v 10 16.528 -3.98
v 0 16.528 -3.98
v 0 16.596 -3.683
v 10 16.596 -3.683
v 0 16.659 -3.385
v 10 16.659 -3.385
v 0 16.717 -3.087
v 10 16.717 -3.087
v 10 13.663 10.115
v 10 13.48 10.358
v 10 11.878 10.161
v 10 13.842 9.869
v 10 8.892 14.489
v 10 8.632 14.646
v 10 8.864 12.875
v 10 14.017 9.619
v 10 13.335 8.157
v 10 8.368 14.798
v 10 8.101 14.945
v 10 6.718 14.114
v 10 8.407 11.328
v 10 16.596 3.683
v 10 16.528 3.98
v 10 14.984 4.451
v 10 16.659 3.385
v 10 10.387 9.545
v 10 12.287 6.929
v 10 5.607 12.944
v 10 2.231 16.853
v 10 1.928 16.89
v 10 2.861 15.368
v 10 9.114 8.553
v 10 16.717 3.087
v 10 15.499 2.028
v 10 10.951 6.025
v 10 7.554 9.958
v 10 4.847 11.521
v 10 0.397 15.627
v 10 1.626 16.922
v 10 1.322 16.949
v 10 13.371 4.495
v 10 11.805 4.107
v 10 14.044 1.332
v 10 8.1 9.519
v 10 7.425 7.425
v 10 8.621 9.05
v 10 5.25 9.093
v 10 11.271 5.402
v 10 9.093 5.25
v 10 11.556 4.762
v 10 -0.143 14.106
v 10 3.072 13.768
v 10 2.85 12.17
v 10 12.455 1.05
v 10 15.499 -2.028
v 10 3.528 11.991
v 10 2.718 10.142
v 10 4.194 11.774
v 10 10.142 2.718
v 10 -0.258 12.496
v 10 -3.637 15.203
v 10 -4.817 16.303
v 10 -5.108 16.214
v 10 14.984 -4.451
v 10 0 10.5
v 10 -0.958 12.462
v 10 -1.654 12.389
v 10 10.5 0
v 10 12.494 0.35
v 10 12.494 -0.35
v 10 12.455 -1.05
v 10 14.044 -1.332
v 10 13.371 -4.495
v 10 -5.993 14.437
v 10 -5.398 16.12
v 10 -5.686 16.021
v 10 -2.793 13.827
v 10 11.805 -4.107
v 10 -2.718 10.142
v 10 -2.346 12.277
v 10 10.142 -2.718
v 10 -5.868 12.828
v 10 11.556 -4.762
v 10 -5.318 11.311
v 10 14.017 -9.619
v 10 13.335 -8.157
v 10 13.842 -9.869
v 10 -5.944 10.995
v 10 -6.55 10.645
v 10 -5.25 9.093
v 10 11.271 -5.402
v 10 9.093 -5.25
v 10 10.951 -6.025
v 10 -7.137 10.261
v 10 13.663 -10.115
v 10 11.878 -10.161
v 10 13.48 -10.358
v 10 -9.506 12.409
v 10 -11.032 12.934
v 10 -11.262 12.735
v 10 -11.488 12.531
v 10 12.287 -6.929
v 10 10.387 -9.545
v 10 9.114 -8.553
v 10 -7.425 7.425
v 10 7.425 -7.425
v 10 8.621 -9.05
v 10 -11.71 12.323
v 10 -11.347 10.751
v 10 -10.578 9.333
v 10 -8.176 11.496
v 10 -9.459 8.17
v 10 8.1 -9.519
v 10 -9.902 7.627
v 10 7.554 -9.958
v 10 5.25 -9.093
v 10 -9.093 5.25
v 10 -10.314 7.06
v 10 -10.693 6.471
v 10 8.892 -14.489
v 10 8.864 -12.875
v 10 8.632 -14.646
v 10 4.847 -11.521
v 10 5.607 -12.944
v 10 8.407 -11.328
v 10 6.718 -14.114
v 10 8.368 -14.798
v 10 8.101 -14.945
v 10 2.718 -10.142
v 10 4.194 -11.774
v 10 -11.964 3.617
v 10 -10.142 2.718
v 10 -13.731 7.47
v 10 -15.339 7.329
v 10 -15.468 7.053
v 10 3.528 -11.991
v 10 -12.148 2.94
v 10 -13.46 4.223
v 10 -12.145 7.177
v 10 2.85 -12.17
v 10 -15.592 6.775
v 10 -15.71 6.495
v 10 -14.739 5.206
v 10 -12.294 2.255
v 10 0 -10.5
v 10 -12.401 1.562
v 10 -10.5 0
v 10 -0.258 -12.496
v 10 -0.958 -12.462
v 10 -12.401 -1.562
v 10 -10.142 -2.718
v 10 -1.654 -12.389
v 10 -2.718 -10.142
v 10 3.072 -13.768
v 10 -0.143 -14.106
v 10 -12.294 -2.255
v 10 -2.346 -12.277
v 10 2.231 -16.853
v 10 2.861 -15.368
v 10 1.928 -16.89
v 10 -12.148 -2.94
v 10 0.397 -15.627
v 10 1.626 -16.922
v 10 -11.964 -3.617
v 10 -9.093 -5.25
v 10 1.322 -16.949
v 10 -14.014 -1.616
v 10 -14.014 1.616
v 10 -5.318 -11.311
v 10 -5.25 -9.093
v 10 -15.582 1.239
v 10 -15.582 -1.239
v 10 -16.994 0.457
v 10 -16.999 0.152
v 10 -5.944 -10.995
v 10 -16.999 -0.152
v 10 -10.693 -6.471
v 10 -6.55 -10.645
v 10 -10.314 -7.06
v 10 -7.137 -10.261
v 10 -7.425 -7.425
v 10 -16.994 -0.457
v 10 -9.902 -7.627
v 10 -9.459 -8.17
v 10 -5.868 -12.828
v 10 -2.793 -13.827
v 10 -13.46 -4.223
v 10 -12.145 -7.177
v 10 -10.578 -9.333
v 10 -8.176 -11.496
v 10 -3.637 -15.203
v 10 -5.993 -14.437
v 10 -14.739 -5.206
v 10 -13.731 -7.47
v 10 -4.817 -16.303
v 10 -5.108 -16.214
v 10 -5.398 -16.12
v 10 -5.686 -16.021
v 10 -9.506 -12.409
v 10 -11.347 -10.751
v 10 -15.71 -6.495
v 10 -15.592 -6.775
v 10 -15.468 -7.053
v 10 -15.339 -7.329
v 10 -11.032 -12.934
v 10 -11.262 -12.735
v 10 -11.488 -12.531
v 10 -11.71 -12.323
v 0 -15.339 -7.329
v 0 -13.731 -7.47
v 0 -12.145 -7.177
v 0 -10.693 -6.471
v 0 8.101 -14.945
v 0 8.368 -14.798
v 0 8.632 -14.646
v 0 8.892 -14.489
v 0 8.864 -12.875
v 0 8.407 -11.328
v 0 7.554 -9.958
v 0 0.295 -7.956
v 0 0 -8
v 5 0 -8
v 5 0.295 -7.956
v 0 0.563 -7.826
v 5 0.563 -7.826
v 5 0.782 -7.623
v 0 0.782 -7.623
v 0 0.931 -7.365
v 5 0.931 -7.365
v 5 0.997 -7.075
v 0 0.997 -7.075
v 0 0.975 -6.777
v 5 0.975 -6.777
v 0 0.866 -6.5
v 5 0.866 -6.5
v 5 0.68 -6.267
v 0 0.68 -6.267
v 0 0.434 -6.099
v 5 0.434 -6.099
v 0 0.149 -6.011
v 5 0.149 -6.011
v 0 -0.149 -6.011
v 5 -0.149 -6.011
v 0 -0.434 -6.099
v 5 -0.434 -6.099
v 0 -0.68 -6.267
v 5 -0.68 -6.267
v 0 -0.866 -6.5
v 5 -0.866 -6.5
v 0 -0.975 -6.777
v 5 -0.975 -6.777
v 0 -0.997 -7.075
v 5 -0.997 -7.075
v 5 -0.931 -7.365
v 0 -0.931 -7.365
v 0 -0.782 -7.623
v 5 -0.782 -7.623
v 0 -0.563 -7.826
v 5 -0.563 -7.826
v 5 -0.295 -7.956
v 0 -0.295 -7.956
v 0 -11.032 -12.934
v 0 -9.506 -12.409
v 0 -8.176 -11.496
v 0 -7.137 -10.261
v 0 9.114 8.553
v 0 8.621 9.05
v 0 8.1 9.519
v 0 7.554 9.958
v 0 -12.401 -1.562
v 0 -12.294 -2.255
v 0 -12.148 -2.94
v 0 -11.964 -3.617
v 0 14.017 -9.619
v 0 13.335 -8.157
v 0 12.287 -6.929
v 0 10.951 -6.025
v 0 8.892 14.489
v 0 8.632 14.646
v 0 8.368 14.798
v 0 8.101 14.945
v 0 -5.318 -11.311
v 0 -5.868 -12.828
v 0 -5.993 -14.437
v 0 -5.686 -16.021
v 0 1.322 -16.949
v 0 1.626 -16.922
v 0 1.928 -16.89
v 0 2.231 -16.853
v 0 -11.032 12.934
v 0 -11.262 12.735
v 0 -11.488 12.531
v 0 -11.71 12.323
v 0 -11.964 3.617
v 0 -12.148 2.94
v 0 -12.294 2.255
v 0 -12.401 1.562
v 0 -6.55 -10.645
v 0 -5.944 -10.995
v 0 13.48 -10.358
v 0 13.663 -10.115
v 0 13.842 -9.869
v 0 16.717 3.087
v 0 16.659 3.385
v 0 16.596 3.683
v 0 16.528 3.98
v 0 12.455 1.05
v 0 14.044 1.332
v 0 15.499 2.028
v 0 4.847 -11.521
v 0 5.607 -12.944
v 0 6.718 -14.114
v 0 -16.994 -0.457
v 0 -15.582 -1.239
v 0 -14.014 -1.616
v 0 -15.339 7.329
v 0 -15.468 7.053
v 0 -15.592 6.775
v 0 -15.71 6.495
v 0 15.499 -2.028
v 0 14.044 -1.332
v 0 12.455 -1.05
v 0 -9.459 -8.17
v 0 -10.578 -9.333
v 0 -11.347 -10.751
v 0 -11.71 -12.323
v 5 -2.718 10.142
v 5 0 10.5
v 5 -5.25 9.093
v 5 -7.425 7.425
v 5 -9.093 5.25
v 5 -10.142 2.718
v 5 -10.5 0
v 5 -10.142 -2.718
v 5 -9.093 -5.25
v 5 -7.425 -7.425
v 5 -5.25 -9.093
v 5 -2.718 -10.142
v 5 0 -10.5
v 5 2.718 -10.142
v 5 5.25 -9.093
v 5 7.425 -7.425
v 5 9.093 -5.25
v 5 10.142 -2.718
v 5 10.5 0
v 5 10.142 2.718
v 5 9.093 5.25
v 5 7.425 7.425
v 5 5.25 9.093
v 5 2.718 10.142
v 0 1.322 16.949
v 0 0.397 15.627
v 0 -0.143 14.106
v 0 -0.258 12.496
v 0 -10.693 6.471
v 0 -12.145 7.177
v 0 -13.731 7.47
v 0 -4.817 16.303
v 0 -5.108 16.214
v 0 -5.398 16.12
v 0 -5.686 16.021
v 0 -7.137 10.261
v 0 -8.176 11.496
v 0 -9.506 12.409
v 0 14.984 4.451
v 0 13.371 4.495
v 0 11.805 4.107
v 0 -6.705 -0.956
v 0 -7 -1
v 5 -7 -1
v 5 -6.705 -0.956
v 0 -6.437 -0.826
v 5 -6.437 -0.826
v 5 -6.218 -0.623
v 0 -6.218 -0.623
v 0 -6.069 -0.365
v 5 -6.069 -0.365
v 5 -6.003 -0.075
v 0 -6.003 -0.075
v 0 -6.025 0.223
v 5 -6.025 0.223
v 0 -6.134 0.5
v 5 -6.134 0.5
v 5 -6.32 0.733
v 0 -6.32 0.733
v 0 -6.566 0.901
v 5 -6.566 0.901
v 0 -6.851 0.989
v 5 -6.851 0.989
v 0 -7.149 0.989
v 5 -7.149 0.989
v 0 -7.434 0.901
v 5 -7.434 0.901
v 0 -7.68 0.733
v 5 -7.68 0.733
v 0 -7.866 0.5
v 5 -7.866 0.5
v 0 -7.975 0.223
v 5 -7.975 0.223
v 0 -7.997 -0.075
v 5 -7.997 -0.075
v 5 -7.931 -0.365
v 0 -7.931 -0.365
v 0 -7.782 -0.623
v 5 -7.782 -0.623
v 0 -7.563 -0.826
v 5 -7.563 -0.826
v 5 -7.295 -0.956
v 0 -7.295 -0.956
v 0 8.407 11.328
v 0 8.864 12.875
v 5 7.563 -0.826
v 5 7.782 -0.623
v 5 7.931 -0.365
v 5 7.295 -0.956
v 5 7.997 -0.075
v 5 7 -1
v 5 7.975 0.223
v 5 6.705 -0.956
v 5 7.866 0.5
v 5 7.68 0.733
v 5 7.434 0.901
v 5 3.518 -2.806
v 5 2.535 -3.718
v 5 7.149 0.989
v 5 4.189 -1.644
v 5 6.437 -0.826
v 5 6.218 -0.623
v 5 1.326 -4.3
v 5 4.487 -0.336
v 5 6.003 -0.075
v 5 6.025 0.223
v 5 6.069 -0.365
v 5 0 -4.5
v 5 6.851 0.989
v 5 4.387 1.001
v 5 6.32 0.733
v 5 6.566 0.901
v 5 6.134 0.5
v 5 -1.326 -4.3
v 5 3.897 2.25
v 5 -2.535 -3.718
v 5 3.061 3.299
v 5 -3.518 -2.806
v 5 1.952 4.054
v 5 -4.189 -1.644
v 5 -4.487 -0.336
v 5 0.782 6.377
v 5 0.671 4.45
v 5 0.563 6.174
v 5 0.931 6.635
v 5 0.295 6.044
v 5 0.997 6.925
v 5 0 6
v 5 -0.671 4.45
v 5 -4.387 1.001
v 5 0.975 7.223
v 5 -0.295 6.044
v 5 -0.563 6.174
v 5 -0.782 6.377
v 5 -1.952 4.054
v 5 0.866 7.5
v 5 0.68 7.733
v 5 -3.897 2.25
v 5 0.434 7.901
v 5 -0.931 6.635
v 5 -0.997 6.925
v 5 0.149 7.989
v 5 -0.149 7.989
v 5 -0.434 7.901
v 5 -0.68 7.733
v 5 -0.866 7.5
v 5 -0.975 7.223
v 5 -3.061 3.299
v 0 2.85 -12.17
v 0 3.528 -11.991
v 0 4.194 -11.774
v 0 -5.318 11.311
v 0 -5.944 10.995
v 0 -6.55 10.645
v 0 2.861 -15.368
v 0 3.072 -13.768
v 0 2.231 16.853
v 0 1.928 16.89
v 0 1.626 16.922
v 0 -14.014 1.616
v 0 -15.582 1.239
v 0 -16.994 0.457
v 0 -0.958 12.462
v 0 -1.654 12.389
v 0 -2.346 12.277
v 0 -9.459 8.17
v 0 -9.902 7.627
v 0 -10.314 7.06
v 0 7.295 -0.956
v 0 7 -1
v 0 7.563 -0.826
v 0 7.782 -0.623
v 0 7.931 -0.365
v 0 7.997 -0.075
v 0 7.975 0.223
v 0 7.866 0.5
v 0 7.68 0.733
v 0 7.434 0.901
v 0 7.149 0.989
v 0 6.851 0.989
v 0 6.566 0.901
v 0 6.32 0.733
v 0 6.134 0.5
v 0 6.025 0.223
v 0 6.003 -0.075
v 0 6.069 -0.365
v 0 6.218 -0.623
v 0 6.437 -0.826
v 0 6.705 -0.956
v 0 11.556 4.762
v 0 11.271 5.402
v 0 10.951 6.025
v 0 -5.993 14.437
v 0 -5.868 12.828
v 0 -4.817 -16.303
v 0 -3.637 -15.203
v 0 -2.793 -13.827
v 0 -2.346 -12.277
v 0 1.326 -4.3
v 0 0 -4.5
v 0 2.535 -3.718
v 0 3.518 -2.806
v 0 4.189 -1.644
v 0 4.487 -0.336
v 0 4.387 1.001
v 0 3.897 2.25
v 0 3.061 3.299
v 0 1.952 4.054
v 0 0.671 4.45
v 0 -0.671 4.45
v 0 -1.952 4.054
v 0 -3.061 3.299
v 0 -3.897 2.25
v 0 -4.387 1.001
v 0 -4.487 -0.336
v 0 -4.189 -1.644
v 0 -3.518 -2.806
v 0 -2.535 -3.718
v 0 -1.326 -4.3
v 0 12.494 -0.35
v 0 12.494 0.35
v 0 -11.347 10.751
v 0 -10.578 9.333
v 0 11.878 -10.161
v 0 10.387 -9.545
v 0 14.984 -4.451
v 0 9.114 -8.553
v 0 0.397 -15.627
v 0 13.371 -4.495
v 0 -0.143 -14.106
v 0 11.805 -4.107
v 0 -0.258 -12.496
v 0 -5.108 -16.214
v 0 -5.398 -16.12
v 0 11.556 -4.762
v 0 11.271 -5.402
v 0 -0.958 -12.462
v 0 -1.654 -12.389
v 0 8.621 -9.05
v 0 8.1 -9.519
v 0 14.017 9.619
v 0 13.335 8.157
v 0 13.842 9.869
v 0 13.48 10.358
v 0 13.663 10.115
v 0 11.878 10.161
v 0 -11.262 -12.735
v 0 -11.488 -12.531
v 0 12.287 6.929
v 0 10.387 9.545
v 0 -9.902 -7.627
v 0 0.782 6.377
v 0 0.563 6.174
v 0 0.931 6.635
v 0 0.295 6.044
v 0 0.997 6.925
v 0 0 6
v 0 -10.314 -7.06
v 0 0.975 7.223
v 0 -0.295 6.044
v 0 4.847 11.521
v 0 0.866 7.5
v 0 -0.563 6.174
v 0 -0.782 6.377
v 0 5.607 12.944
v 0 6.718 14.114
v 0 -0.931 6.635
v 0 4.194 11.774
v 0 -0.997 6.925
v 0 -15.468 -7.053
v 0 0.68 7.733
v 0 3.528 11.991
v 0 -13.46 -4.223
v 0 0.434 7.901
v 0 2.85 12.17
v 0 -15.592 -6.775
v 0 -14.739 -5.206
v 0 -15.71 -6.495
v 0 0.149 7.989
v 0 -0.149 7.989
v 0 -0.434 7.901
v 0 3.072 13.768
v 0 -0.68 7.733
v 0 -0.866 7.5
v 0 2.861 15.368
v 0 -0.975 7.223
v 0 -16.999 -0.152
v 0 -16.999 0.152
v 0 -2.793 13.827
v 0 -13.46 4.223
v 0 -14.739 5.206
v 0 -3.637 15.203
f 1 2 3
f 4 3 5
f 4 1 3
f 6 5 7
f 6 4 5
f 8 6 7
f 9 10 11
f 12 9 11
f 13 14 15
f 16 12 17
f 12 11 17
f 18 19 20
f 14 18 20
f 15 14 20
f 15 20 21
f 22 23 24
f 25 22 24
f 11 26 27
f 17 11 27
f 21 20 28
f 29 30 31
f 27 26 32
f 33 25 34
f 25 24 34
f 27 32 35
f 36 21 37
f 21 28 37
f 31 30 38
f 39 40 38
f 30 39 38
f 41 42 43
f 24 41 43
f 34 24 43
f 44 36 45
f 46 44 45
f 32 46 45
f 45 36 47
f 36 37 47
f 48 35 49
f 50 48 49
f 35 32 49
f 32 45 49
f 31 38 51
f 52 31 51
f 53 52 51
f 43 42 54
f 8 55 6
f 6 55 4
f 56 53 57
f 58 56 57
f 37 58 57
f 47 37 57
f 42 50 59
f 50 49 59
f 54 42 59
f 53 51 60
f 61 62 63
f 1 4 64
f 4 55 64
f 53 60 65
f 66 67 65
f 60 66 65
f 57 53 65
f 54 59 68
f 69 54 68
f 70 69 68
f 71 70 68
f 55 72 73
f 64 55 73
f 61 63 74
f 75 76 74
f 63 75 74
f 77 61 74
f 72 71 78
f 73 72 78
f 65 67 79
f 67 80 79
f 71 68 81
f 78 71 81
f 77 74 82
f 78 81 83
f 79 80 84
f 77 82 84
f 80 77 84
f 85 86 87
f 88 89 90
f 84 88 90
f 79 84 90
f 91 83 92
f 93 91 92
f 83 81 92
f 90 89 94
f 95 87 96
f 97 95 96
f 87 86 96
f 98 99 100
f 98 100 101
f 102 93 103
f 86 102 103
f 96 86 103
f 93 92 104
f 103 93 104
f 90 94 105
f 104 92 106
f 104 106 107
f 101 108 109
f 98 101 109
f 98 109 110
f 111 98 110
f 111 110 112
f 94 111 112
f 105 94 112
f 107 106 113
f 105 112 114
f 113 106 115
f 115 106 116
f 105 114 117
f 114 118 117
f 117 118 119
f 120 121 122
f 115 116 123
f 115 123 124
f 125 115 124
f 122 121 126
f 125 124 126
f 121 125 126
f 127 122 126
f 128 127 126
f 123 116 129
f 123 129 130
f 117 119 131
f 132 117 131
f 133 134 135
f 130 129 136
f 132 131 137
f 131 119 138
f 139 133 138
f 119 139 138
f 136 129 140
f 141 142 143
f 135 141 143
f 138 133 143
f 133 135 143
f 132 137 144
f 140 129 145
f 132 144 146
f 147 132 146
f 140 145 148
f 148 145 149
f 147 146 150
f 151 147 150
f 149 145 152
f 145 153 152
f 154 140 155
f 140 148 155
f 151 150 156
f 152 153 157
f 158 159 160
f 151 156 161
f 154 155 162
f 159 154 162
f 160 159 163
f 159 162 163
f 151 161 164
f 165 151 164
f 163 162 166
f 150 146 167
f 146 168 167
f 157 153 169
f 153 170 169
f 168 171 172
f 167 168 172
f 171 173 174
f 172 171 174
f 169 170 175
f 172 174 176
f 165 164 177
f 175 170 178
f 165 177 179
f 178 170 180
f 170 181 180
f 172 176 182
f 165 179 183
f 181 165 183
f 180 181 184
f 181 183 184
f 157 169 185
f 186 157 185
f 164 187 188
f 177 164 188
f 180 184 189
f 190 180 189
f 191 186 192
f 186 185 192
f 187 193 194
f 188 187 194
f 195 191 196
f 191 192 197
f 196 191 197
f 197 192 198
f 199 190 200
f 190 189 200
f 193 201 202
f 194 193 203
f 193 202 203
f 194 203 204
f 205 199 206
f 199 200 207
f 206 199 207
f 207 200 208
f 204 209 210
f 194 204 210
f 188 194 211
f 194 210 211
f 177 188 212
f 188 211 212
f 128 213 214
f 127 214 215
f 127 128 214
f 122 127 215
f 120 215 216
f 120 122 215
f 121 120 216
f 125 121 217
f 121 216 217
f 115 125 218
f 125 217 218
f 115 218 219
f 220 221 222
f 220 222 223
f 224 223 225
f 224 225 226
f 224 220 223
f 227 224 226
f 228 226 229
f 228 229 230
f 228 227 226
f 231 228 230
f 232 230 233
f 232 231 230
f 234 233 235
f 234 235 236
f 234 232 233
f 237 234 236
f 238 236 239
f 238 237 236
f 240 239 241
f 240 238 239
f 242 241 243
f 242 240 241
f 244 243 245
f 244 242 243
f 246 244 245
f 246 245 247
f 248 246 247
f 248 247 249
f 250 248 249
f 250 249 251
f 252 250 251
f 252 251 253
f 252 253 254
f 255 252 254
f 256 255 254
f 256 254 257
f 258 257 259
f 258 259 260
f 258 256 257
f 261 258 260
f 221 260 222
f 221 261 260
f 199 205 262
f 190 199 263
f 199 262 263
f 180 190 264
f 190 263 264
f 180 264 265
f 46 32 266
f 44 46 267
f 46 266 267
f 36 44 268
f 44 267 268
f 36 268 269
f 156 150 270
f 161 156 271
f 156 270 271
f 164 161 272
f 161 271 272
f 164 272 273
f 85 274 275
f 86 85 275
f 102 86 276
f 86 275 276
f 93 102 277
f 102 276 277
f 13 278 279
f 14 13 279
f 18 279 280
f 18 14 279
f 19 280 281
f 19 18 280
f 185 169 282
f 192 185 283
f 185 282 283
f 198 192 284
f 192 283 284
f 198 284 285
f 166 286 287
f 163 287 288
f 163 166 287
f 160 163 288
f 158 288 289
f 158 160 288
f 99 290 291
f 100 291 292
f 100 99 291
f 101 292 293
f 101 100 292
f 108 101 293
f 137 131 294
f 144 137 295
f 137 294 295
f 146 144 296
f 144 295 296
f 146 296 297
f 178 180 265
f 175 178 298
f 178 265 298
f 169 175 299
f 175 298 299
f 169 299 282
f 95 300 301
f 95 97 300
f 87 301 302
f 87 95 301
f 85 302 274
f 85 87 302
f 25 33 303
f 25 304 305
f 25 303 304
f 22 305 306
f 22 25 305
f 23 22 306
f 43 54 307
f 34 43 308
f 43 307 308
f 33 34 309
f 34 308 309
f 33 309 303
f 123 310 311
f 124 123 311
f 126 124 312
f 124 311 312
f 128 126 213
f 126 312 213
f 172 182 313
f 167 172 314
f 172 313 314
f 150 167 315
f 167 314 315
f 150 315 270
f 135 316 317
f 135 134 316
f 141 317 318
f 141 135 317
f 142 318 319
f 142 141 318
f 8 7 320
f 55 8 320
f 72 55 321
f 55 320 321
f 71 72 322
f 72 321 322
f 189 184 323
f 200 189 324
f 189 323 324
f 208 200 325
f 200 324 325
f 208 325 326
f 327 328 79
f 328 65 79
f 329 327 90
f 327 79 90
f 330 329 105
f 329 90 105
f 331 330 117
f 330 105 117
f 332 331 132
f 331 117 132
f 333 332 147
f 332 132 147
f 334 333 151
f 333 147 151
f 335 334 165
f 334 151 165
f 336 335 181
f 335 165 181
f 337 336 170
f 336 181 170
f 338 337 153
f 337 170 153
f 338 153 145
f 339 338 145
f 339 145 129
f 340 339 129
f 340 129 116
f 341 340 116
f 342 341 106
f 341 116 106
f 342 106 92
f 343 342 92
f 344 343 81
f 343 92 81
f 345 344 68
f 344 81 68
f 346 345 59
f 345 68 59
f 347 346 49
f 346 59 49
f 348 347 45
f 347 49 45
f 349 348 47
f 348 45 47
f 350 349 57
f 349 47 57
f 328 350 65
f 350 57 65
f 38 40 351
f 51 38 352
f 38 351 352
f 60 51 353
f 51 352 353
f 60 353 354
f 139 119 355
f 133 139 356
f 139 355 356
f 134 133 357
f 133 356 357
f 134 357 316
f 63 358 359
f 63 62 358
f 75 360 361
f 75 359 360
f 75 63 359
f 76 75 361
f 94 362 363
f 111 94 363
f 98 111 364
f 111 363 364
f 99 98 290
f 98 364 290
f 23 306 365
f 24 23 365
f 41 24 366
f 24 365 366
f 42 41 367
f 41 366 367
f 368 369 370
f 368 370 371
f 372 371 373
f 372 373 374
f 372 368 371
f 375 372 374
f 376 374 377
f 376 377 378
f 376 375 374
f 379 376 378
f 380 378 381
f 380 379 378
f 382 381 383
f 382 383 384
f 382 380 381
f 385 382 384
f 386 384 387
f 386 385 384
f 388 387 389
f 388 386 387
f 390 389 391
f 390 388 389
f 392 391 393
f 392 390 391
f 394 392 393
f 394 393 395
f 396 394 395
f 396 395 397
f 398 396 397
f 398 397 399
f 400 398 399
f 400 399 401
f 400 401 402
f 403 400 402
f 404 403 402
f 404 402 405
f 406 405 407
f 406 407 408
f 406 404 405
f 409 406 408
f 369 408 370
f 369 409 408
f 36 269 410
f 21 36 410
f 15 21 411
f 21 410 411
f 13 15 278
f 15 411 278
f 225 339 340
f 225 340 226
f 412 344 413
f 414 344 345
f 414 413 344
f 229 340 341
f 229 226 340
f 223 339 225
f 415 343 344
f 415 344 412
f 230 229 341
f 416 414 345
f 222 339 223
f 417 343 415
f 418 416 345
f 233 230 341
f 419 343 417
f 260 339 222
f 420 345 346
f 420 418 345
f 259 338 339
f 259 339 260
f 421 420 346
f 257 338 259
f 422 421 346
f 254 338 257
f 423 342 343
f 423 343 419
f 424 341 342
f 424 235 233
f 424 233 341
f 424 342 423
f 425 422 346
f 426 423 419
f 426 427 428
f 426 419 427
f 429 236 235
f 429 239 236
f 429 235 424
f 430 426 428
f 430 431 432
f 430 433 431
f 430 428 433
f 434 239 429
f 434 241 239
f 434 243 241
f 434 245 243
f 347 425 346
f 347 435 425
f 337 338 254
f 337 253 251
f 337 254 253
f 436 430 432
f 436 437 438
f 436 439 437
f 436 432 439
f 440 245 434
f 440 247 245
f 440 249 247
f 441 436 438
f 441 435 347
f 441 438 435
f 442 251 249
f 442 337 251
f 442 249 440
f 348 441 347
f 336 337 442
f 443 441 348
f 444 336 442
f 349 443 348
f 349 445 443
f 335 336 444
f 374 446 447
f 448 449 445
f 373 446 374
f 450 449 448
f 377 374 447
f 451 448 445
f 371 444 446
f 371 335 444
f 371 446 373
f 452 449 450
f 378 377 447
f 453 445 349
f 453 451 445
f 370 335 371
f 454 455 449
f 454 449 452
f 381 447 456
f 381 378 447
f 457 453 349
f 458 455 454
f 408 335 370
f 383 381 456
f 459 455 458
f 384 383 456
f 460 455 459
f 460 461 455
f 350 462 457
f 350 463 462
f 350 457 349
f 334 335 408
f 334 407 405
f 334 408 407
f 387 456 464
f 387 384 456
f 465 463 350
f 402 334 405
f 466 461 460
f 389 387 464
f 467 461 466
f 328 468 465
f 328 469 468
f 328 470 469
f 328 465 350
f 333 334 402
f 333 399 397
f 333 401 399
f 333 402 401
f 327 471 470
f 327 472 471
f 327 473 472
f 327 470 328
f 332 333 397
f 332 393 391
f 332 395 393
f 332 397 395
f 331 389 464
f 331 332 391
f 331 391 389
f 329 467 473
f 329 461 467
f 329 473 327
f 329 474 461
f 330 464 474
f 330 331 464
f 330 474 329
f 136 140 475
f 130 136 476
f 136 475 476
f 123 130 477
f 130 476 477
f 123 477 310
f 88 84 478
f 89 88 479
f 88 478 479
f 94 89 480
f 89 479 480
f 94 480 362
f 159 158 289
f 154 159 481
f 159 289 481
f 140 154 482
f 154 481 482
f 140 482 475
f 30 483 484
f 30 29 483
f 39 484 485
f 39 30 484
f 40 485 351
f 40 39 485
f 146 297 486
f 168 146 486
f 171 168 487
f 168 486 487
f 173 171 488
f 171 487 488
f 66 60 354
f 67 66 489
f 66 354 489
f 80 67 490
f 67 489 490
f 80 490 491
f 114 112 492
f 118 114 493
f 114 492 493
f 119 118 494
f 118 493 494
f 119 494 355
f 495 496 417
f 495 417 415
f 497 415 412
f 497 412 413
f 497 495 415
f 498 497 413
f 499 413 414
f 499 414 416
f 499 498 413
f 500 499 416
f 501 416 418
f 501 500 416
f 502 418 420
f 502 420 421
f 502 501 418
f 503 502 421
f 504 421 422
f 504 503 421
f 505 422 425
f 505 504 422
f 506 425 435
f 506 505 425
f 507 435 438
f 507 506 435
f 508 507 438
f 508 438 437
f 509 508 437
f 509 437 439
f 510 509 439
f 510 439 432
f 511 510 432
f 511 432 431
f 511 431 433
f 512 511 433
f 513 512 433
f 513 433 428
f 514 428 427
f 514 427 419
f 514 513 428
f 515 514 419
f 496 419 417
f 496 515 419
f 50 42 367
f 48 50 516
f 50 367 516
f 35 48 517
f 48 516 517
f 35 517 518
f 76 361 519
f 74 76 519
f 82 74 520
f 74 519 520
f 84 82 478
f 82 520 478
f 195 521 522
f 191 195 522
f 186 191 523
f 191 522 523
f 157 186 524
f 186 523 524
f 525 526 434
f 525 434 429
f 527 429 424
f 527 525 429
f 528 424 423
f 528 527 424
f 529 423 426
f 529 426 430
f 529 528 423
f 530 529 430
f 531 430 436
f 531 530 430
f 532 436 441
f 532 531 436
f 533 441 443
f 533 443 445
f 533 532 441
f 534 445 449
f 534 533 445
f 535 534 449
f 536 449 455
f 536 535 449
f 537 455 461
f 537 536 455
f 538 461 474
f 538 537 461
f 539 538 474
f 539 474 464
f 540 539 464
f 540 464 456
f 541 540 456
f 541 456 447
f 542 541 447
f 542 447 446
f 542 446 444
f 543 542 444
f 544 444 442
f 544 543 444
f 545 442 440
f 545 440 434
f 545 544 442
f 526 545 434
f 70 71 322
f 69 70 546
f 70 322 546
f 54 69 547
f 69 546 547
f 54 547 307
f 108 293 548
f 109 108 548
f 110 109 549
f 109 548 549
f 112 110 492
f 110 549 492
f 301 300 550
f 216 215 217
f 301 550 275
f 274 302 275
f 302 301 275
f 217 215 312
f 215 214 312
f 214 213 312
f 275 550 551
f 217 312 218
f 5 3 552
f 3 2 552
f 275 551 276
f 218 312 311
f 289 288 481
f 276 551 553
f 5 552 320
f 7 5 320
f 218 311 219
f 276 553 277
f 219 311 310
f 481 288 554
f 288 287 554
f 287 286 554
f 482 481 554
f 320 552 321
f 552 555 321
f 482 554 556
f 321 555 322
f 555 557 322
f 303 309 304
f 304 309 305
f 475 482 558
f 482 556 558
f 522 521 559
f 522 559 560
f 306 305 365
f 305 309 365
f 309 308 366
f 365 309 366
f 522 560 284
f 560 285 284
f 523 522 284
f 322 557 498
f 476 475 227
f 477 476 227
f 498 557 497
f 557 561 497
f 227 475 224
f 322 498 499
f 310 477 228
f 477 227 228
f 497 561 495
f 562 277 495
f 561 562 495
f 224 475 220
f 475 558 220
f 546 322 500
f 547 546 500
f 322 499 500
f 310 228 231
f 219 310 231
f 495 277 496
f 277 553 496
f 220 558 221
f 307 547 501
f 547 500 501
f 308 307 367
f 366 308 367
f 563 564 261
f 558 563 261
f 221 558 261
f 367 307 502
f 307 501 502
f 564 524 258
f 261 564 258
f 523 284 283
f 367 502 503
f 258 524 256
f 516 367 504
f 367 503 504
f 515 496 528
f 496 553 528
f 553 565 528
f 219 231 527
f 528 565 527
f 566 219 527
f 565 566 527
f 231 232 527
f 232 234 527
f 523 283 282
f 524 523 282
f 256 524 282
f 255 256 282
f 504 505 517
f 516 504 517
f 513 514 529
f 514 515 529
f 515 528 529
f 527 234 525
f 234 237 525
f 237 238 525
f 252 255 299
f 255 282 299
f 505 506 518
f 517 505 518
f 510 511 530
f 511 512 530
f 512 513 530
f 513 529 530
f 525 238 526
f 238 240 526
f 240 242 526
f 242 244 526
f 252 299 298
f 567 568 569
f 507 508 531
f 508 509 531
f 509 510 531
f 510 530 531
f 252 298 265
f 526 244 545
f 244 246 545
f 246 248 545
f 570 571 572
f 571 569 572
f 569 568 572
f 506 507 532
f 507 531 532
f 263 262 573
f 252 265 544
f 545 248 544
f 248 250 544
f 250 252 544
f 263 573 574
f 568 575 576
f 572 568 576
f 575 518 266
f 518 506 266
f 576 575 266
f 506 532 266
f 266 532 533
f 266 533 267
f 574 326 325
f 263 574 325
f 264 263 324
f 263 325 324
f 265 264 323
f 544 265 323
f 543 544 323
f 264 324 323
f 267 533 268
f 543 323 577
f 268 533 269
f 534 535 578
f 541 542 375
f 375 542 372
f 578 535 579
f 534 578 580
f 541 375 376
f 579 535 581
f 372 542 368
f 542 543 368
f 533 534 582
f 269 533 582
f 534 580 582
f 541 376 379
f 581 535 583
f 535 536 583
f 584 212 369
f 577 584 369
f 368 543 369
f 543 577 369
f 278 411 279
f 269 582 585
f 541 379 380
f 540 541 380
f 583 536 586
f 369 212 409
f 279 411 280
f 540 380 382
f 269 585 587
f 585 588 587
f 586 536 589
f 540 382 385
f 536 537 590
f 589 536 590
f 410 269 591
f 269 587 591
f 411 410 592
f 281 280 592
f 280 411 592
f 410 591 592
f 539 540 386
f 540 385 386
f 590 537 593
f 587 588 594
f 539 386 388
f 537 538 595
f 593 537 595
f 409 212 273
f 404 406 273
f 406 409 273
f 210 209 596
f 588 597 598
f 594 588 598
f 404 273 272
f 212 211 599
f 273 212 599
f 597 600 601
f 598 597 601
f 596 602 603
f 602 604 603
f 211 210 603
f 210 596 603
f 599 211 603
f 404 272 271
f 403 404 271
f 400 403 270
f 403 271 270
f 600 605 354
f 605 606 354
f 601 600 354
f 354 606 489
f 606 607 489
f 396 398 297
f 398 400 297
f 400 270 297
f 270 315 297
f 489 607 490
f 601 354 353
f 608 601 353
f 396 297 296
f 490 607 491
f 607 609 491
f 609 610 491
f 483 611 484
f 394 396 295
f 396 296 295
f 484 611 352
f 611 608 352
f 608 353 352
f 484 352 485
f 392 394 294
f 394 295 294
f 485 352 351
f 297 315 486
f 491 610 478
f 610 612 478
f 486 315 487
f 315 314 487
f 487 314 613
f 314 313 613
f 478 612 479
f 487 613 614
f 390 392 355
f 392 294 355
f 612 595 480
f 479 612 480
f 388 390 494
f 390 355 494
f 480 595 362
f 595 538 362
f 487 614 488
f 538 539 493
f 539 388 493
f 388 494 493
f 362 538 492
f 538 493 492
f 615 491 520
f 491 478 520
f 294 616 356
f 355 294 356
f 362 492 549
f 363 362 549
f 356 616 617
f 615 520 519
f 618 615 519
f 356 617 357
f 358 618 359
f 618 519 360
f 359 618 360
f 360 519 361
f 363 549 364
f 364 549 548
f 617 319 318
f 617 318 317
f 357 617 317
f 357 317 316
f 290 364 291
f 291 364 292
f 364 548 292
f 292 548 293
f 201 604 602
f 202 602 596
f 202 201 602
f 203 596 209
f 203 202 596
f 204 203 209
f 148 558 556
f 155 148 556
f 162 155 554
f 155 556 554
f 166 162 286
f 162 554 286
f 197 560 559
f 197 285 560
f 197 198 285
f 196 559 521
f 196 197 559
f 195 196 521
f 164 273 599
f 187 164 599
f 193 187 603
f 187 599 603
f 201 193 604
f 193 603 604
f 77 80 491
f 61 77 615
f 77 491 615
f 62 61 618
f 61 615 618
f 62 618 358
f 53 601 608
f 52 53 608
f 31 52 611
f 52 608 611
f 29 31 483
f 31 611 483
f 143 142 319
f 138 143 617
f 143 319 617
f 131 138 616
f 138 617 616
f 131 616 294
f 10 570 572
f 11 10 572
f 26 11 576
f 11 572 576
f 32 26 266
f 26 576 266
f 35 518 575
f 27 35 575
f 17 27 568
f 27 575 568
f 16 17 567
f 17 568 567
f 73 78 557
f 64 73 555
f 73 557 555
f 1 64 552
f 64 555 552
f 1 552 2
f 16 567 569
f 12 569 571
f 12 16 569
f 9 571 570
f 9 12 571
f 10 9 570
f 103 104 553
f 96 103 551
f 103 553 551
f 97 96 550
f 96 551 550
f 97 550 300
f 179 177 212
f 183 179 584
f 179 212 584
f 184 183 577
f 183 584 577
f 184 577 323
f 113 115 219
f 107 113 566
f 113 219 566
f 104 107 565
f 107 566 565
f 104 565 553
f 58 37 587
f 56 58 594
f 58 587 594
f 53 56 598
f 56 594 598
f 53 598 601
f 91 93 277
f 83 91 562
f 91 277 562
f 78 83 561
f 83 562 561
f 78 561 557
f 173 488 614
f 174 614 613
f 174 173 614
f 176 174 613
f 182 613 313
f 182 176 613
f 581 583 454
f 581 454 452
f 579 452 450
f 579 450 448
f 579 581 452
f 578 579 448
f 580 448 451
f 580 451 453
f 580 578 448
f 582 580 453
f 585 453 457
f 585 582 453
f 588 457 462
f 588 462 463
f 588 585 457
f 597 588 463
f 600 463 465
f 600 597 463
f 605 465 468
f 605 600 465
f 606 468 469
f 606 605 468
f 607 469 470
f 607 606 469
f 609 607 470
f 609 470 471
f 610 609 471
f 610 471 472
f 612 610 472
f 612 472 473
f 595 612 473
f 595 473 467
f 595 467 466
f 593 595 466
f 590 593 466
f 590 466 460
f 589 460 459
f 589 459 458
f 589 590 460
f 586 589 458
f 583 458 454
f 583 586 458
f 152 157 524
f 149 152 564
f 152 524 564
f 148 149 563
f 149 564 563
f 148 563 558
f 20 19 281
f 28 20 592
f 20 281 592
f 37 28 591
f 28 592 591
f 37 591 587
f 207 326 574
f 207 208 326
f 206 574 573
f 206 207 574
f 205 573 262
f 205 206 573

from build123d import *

# Parameters (mm, degrees)
BASPROSKE_W         = 10
BASPROSKE_H         = 17
TOOTHCUT_DEPTH      = 27.038433133
TEETHCUTS_COUNT     = 15
BORSKE_R            = 10.5
BORE_DEPTH          = 10
SKETCH1_R           = 10.5
SKETCH1_R_2         = 1
SKETCH1_R_3         = 4.5
BOSS_EXTRUDE1_DEPTH = 5


with BuildPart() as part:
    # BasProSke → Base-Revolve (revolve)
    with BuildSketch(Plane(origin=(0, 0, 0), x_dir=(1, 0, 0), z_dir=(0, 1, 0)), mode=Mode.PRIVATE) as base_revolve_sk:
        with Locations((5, 8.5)):
            Rectangle(BASPROSKE_W, BASPROSKE_H)
    revolve(base_revolve_sk.sketch.rotate(Axis((-10, 0, 0), (1, 0, 0)), 180), axis=Axis((-10, 0, 0), (1, 0, 0)))

    # TooCutSke → ToothCut (cut, through all)
    with BuildSketch(Plane(origin=(0, 0, 0), x_dir=(0, 0, -1), z_dir=(1, 0, 0))):
        with BuildLine():
            ThreePointArc((1.050056448, 12.454813626), (0, 12.499), (-1.050056448, 12.454813626))
            ThreePointArc((-1.050056448, 12.454813626), (-1.638118106, 14.809604533), (-3.110934279, 16.73876737))
            ThreePointArc((-3.110934279, 16.73876737), (0, 17.0254), (3.110934279, 16.73876737))
            ThreePointArc((3.110934279, 16.73876737), (1.638118106, 14.809604533), (1.050056448, 12.454813626))
        make_face()
    toothcut = extrude(amount=TOOTHCUT_DEPTH, mode=Mode.SUBTRACT)

    # TeethCuts: ToothCut ×15 about axis
    teethcuts_axis = Axis((0, 0, 0), (1, 0, 0))
    for i in range(1, TEETHCUTS_COUNT):
        add(toothcut.rotate(teethcuts_axis, i * 360 / TEETHCUTS_COUNT), mode=Mode.SUBTRACT)

    # BorSke → Bore (cut, symmetric)
    with BuildSketch(Plane(origin=(0, 0, 0), x_dir=(0, 0, -1), z_dir=(1, 0, 0))):
        with Locations(Location((0, 0, 0), (0, 0, 180))):
            Circle(BORSKE_R)
    extrude(amount=BORE_DEPTH, both=True, mode=Mode.SUBTRACT)

    # Sketch1 → Boss-Extrude1 (add)
    with BuildSketch(Plane(origin=(0, 0, 0), x_dir=(0, 0, -1), z_dir=(1, 0, 0))):
        with Locations(Location((0, 0, 0), (0, 0, 180))):
            Circle(SKETCH1_R)
        with Locations((7, 0)):
            Circle(SKETCH1_R_2, mode=Mode.SUBTRACT)
        with Locations((-7, 0)):
            Circle(SKETCH1_R_2, mode=Mode.SUBTRACT)
        with Locations((0, 7)):
            Circle(SKETCH1_R_2, mode=Mode.SUBTRACT)
        with Locations((0, -7)):
            Circle(SKETCH1_R_2, mode=Mode.SUBTRACT)
        Circle(SKETCH1_R_3, mode=Mode.SUBTRACT)
    extrude(amount=BOSS_EXTRUDE1_DEPTH)


solid = part.part
